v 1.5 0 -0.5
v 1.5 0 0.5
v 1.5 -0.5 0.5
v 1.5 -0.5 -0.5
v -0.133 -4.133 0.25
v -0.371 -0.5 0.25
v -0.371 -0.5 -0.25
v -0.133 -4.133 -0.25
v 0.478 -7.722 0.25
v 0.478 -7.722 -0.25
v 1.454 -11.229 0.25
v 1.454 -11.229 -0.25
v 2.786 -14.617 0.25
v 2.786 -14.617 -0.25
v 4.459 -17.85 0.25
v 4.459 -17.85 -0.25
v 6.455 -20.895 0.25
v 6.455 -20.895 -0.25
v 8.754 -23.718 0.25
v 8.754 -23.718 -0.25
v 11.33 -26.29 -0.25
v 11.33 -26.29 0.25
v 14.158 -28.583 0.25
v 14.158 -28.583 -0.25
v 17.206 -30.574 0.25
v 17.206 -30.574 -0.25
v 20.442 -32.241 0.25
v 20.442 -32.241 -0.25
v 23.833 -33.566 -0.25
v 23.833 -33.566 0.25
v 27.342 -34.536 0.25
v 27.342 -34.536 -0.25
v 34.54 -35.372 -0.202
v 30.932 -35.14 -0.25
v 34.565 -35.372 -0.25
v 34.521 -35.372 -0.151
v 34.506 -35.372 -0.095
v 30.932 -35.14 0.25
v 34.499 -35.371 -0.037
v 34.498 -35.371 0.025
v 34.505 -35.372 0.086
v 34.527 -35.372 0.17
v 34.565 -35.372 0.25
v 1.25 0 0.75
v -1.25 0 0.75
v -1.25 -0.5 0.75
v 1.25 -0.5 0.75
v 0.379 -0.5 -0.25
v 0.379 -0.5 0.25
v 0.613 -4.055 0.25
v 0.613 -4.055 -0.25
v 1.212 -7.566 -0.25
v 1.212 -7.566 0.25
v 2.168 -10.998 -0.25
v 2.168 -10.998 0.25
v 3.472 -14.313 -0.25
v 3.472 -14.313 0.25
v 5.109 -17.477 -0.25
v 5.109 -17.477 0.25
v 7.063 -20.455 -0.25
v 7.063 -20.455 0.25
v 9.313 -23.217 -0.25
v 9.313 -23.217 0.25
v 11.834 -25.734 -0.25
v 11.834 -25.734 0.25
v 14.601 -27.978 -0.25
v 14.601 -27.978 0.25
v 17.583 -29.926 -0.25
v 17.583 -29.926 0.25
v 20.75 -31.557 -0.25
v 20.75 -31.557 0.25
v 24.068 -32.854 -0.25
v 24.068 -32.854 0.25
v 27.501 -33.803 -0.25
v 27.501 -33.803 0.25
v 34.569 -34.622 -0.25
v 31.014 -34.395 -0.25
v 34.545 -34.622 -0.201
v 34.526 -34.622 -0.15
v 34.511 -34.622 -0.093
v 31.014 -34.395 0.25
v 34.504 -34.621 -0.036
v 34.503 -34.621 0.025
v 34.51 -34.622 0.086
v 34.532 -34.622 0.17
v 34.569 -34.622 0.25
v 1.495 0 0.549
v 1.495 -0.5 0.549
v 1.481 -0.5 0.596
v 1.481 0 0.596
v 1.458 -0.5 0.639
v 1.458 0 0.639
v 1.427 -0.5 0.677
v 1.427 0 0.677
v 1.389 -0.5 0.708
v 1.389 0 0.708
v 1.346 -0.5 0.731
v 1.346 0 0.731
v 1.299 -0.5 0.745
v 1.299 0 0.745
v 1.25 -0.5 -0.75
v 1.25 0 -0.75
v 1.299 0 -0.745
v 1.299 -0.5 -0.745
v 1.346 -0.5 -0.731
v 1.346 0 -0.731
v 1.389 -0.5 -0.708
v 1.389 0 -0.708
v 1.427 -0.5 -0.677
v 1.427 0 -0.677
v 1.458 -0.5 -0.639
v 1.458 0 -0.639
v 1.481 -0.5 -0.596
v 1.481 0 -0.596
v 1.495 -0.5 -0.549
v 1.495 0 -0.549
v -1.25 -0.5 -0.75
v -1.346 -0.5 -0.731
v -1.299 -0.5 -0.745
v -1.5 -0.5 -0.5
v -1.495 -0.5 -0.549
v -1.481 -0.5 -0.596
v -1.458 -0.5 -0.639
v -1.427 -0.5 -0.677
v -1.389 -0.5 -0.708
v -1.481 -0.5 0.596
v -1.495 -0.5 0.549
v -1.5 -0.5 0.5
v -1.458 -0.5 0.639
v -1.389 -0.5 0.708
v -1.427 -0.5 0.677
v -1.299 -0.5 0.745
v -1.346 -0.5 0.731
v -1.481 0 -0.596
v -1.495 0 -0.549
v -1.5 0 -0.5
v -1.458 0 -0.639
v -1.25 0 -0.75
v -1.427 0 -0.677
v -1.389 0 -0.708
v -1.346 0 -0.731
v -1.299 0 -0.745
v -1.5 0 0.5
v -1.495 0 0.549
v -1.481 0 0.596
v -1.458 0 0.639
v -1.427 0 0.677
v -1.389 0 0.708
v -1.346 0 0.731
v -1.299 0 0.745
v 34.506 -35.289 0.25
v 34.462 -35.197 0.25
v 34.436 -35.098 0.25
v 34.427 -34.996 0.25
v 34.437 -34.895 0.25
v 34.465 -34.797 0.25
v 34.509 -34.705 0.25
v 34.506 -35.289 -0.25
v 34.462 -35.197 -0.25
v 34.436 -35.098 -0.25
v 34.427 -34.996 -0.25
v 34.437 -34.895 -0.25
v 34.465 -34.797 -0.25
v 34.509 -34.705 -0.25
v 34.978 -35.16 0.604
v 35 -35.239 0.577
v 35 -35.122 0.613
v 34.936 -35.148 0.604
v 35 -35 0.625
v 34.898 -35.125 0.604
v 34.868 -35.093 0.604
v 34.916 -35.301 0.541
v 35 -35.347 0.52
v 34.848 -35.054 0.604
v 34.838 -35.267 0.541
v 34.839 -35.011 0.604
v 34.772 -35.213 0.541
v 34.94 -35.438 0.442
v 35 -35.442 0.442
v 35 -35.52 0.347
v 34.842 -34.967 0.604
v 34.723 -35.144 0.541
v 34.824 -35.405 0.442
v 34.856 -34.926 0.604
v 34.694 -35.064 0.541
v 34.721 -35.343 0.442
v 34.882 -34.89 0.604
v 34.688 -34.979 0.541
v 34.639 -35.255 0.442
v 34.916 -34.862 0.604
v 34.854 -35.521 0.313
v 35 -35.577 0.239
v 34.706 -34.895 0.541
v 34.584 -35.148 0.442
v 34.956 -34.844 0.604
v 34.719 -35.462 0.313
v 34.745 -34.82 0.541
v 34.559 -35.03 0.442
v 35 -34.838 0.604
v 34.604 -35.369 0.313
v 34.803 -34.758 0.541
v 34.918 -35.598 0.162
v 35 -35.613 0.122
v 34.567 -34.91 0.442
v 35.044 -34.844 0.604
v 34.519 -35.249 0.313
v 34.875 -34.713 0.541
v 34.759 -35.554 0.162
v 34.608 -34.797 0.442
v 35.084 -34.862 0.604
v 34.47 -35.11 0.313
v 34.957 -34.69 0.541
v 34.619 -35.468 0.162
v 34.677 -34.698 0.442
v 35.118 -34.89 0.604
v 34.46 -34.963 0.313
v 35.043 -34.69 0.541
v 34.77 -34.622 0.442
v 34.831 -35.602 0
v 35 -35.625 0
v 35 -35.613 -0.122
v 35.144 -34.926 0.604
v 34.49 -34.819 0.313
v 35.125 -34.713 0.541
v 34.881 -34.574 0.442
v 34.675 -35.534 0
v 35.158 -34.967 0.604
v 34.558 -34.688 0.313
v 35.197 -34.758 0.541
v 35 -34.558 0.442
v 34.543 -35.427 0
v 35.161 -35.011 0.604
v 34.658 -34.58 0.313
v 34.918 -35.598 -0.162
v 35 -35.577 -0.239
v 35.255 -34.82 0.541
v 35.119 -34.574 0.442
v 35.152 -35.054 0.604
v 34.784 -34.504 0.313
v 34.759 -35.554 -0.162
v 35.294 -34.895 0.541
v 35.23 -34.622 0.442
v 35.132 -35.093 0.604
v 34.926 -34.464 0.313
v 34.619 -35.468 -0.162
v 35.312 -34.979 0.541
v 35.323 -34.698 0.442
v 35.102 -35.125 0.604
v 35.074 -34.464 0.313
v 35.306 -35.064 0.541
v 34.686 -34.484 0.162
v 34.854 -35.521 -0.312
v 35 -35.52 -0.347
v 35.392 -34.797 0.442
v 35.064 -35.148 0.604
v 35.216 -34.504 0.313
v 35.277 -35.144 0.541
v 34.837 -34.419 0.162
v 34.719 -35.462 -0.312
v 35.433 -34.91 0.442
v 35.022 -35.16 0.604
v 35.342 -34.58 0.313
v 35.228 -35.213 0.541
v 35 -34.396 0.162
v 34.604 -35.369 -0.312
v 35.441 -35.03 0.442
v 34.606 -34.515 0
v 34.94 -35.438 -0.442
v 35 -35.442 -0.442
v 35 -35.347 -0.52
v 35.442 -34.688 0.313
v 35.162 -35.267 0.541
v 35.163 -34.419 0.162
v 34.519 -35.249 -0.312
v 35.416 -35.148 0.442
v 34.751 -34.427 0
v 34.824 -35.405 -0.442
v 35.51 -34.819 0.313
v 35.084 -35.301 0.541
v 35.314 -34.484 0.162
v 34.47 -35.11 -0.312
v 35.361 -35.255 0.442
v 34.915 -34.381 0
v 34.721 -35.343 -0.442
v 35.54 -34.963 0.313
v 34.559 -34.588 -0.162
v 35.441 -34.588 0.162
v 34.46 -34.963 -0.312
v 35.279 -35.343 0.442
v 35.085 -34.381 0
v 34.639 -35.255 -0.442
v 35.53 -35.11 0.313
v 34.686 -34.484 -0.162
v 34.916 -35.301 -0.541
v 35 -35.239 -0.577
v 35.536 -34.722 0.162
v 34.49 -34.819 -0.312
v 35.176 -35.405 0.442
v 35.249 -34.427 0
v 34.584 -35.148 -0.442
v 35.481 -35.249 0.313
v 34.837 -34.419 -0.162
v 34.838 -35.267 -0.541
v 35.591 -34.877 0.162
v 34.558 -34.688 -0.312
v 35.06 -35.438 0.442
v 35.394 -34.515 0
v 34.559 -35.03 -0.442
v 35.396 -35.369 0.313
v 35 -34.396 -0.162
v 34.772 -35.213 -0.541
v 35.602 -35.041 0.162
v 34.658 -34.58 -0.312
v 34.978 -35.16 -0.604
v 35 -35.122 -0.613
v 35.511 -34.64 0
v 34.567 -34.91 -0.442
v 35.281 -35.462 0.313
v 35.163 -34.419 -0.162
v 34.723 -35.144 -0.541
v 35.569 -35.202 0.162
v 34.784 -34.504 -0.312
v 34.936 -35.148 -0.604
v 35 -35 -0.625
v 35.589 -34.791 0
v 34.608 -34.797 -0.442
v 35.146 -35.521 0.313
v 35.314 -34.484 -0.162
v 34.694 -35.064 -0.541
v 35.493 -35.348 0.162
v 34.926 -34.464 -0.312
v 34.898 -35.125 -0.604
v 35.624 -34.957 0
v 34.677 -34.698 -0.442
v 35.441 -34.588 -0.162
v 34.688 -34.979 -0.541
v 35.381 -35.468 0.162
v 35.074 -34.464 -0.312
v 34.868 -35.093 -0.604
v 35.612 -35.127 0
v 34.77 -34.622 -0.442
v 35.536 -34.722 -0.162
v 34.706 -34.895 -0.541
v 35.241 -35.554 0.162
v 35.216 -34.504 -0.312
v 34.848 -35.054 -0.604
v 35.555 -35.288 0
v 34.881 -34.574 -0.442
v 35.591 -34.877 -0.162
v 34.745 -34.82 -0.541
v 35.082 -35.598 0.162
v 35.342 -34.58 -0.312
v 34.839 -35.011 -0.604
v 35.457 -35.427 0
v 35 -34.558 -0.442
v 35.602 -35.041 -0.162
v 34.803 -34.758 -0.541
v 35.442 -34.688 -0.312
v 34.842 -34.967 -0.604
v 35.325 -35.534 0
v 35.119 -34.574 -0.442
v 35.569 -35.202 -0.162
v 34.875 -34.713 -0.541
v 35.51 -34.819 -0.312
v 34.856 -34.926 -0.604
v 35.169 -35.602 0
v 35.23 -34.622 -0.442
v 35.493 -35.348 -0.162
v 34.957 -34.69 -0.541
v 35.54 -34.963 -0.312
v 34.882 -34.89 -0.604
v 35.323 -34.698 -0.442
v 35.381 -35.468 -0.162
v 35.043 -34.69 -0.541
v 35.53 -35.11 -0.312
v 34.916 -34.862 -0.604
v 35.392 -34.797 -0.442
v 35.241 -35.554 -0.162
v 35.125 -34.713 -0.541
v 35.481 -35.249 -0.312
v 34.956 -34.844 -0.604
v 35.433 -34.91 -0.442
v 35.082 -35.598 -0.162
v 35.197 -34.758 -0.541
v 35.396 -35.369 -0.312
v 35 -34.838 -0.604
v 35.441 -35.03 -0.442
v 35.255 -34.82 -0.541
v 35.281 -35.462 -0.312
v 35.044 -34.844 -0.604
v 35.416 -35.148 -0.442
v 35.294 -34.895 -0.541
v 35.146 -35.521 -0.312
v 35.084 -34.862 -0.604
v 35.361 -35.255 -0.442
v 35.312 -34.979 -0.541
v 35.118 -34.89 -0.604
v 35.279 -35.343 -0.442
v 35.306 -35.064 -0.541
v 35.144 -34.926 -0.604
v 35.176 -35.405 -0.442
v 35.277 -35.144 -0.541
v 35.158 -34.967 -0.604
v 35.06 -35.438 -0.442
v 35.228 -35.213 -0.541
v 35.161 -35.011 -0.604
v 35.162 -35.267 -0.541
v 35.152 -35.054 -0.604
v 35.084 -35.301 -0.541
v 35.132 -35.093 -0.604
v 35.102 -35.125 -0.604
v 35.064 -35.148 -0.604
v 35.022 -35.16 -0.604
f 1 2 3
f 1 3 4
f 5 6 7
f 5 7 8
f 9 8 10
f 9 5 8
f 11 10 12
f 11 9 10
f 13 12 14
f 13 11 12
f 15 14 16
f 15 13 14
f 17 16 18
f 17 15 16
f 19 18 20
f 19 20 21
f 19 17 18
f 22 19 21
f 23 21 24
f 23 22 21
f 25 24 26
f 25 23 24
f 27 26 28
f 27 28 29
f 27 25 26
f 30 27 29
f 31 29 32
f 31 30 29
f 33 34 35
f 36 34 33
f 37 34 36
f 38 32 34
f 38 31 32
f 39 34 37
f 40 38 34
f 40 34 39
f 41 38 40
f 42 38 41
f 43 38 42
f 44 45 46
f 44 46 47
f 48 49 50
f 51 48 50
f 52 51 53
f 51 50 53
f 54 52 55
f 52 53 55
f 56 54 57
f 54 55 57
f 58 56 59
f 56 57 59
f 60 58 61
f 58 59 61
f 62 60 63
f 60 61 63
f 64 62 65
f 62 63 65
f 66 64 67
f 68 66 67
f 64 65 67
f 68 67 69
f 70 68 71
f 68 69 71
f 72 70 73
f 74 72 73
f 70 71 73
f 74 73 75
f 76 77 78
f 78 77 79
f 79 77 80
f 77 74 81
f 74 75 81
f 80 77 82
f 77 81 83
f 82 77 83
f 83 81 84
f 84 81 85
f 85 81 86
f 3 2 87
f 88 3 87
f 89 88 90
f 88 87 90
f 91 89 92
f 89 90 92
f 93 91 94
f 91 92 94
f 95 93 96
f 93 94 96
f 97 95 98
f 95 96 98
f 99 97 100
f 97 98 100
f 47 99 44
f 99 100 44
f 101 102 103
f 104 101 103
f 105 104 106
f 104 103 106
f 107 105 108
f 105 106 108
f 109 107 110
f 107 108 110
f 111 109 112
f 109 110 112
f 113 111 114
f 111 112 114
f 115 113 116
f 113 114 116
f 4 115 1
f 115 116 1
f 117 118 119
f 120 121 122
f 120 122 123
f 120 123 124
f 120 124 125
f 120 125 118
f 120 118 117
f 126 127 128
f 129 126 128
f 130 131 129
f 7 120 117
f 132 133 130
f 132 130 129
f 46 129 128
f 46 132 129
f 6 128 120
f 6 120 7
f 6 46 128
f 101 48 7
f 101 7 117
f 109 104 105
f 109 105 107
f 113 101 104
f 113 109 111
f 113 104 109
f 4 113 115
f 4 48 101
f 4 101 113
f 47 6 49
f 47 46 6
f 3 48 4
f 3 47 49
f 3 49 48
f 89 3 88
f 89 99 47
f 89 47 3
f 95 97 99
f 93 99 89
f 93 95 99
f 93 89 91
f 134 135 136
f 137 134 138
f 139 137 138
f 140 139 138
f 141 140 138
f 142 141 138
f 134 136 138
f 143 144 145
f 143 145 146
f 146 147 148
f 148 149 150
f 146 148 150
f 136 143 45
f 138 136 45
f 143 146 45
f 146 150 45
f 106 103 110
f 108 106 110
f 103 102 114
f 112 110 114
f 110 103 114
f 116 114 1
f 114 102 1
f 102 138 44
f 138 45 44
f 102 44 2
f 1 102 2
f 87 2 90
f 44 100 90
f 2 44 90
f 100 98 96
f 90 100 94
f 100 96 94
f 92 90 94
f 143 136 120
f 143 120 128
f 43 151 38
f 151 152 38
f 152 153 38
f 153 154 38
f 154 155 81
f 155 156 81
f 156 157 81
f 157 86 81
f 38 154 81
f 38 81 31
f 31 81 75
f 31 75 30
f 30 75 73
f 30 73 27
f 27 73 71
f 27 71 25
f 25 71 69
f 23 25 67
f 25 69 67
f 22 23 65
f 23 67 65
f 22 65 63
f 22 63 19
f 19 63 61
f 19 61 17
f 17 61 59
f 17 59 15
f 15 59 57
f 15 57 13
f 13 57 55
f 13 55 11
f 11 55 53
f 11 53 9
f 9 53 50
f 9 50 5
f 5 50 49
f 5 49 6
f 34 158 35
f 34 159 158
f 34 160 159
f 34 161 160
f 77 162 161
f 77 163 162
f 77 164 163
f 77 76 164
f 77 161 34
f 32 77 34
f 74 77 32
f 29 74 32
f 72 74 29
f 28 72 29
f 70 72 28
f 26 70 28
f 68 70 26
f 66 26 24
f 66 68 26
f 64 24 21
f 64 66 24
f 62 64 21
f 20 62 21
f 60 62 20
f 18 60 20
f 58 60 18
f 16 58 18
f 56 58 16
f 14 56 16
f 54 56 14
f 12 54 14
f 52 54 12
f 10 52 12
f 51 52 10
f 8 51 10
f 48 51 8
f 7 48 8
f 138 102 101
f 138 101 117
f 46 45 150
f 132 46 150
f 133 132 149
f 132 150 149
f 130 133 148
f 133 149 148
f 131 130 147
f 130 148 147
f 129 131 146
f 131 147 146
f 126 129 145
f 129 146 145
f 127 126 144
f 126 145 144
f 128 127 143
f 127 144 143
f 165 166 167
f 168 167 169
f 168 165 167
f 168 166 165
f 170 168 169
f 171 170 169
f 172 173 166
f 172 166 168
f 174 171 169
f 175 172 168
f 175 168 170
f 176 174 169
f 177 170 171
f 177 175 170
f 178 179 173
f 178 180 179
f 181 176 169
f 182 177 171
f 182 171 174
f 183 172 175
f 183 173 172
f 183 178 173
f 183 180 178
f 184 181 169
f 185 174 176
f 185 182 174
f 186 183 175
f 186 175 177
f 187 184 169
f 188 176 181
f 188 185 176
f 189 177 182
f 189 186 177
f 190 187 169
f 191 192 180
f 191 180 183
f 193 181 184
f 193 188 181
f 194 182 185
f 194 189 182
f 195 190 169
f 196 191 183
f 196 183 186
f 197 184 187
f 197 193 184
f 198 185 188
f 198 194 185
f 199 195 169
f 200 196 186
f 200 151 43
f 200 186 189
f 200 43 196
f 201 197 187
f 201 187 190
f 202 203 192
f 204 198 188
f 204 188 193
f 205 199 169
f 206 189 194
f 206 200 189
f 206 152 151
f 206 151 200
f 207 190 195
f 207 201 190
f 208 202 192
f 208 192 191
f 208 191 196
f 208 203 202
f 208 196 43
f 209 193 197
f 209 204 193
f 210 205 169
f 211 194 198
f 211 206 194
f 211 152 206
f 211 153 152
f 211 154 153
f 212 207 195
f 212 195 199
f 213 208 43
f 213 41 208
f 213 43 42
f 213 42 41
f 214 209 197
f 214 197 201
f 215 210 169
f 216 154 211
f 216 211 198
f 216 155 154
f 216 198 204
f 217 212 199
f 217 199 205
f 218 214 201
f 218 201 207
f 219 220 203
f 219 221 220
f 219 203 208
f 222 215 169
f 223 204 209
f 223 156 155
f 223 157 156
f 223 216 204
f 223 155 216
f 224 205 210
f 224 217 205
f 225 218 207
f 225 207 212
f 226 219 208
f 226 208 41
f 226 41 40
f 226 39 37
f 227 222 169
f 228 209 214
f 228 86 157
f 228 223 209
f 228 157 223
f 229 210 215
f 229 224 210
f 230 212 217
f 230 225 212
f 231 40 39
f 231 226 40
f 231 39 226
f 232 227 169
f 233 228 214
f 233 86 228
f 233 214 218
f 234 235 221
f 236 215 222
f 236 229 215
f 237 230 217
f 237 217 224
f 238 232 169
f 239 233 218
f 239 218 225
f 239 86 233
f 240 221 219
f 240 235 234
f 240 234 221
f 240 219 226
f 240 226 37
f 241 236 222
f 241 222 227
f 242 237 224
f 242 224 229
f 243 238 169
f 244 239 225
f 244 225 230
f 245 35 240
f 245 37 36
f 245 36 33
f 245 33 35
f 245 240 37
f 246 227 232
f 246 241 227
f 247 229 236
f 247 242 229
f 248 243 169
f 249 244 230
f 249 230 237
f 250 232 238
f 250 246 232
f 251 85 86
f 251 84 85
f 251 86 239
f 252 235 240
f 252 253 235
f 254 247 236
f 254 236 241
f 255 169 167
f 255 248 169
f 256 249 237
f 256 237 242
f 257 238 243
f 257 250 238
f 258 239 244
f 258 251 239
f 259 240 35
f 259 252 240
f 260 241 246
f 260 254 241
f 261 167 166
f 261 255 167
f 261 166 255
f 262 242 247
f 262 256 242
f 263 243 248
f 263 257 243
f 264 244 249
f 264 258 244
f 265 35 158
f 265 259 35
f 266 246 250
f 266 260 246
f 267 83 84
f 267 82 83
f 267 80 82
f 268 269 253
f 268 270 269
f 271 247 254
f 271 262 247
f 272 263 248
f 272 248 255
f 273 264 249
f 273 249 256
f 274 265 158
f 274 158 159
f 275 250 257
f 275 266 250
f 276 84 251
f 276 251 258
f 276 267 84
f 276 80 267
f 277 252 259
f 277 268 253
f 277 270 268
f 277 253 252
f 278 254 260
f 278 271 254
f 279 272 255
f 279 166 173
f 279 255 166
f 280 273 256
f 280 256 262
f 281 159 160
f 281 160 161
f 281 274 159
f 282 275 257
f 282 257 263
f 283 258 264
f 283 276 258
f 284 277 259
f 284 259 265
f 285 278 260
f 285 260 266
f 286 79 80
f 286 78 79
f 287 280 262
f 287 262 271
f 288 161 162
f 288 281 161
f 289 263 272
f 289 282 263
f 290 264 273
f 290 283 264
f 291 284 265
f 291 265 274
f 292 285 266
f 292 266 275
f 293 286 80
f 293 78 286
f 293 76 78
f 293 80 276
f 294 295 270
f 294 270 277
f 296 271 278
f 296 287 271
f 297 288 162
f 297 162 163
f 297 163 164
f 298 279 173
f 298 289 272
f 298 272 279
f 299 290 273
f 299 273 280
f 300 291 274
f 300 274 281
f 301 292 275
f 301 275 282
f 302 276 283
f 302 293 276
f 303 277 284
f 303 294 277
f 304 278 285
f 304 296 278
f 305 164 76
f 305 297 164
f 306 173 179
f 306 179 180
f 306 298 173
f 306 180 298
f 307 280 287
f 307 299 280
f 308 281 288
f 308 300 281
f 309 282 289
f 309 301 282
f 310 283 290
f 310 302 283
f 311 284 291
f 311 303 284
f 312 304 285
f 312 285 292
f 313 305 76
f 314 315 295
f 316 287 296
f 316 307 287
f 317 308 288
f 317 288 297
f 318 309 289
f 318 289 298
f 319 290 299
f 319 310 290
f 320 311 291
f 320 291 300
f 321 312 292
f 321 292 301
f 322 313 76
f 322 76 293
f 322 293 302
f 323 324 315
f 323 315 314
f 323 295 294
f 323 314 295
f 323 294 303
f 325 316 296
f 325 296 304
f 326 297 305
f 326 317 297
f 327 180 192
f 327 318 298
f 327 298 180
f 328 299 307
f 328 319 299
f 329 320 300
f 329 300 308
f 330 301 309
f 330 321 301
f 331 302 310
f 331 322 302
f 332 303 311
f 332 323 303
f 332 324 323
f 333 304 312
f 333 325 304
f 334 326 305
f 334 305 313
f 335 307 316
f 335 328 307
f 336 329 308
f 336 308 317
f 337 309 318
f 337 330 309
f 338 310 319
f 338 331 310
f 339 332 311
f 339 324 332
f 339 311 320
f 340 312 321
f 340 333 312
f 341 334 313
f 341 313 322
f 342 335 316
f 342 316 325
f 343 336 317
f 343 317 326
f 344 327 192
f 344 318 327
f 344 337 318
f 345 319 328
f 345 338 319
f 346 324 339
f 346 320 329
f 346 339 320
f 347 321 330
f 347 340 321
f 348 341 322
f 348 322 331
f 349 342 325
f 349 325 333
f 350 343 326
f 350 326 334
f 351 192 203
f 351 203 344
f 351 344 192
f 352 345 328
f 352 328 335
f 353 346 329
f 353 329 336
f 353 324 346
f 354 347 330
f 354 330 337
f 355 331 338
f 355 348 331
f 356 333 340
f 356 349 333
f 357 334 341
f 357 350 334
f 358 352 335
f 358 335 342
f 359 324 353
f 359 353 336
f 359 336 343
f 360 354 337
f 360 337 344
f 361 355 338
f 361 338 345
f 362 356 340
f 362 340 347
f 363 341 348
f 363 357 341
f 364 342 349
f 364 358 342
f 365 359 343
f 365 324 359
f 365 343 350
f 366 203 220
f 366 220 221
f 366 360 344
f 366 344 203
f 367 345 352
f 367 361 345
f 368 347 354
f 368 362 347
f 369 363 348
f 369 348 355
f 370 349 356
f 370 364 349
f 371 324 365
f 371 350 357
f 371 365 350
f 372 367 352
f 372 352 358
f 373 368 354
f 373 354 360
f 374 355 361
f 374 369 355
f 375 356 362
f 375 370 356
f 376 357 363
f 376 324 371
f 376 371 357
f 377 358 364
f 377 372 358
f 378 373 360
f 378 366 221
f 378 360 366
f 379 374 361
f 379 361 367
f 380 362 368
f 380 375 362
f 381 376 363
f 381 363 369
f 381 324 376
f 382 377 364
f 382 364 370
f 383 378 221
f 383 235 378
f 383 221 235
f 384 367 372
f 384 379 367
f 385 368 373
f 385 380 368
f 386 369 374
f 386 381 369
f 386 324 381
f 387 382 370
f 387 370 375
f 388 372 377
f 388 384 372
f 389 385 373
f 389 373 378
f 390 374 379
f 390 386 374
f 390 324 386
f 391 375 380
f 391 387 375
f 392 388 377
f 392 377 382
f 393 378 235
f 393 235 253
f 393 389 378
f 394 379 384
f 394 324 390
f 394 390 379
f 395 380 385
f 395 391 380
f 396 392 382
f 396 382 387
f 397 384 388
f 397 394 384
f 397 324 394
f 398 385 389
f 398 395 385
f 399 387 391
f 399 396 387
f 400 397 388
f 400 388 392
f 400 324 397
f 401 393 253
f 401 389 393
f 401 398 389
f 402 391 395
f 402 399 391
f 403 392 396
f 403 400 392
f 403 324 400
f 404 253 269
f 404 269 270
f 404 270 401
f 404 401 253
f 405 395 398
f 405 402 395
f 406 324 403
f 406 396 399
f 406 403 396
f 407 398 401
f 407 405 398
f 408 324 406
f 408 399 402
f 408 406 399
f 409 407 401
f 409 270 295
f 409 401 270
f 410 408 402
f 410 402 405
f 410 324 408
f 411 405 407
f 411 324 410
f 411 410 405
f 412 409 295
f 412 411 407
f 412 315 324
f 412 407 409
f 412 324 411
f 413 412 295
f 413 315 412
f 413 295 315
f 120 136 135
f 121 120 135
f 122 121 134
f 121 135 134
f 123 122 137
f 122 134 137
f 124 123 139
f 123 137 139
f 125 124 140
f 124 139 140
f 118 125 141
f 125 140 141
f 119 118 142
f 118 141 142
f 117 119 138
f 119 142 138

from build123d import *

# Parameters (mm, degrees)
PAD_DEPTH    = 0.25
PAD001_DEPTH = 0.5


with BuildPart() as part:
    # Sketch → Pad (new body, symmetric)
    with BuildSketch(Plane.XY):
        with BuildLine():
            Line((-0.375, 0), (0, 0))
            Line((0, 0), (0.375, 0))
            ThreePointArc((0.375, 0), (10.516428, -24.483572), (35, -34.625))
            Line((35, -34.625), (35, -35))
            Line((35, -35), (35, -35.375))
            ThreePointArc((-0.375, 0), (9.986098, -25.013902), (35, -35.375))
        make_face()
    extrude(amount=PAD_DEPTH, both=True)

    # Sketch001 (on DatumPlane) → Revolution (revolve)
    with BuildSketch(Plane(origin=(35, -35, 0), x_dir=(0, 1, 0), z_dir=(1, 0, 0))):
        with BuildLine():
            ThreePointArc((0, 0.625), (-0.625, 0), (0, -0.625))
            Line((0, 0), (0, -0.625))
            Line((0, 0.625), (0, 0))
        make_face()
    revolve(axis=Axis((35, -35, 0), (0, 0, -1)))

    # Sketch002 → Pad001 (join)
    with BuildSketch(Plane.XZ):
        with BuildLine():
            ThreePointArc((-1.25, 0.75), (-1.426777, 0.676777), (-1.5, 0.5))
            Line((-1.5, -0.5), (-1.5, 0.5))
            ThreePointArc((-1.5, -0.5), (-1.426777, -0.676777), (-1.25, -0.75))
            Line((1.25, -0.75), (-1.25, -0.75))
            ThreePointArc((1.25, -0.75), (1.426777, -0.676777), (1.5, -0.5))
            Line((1.5, 0.5), (1.5, -0.5))
            ThreePointArc((1.5, 0.5), (1.426777, 0.676777), (1.25, 0.75))
            Line((-1.25, 0.75), (1.25, 0.75))
        make_face()
    extrude(amount=PAD001_DEPTH)


solid = part.part
